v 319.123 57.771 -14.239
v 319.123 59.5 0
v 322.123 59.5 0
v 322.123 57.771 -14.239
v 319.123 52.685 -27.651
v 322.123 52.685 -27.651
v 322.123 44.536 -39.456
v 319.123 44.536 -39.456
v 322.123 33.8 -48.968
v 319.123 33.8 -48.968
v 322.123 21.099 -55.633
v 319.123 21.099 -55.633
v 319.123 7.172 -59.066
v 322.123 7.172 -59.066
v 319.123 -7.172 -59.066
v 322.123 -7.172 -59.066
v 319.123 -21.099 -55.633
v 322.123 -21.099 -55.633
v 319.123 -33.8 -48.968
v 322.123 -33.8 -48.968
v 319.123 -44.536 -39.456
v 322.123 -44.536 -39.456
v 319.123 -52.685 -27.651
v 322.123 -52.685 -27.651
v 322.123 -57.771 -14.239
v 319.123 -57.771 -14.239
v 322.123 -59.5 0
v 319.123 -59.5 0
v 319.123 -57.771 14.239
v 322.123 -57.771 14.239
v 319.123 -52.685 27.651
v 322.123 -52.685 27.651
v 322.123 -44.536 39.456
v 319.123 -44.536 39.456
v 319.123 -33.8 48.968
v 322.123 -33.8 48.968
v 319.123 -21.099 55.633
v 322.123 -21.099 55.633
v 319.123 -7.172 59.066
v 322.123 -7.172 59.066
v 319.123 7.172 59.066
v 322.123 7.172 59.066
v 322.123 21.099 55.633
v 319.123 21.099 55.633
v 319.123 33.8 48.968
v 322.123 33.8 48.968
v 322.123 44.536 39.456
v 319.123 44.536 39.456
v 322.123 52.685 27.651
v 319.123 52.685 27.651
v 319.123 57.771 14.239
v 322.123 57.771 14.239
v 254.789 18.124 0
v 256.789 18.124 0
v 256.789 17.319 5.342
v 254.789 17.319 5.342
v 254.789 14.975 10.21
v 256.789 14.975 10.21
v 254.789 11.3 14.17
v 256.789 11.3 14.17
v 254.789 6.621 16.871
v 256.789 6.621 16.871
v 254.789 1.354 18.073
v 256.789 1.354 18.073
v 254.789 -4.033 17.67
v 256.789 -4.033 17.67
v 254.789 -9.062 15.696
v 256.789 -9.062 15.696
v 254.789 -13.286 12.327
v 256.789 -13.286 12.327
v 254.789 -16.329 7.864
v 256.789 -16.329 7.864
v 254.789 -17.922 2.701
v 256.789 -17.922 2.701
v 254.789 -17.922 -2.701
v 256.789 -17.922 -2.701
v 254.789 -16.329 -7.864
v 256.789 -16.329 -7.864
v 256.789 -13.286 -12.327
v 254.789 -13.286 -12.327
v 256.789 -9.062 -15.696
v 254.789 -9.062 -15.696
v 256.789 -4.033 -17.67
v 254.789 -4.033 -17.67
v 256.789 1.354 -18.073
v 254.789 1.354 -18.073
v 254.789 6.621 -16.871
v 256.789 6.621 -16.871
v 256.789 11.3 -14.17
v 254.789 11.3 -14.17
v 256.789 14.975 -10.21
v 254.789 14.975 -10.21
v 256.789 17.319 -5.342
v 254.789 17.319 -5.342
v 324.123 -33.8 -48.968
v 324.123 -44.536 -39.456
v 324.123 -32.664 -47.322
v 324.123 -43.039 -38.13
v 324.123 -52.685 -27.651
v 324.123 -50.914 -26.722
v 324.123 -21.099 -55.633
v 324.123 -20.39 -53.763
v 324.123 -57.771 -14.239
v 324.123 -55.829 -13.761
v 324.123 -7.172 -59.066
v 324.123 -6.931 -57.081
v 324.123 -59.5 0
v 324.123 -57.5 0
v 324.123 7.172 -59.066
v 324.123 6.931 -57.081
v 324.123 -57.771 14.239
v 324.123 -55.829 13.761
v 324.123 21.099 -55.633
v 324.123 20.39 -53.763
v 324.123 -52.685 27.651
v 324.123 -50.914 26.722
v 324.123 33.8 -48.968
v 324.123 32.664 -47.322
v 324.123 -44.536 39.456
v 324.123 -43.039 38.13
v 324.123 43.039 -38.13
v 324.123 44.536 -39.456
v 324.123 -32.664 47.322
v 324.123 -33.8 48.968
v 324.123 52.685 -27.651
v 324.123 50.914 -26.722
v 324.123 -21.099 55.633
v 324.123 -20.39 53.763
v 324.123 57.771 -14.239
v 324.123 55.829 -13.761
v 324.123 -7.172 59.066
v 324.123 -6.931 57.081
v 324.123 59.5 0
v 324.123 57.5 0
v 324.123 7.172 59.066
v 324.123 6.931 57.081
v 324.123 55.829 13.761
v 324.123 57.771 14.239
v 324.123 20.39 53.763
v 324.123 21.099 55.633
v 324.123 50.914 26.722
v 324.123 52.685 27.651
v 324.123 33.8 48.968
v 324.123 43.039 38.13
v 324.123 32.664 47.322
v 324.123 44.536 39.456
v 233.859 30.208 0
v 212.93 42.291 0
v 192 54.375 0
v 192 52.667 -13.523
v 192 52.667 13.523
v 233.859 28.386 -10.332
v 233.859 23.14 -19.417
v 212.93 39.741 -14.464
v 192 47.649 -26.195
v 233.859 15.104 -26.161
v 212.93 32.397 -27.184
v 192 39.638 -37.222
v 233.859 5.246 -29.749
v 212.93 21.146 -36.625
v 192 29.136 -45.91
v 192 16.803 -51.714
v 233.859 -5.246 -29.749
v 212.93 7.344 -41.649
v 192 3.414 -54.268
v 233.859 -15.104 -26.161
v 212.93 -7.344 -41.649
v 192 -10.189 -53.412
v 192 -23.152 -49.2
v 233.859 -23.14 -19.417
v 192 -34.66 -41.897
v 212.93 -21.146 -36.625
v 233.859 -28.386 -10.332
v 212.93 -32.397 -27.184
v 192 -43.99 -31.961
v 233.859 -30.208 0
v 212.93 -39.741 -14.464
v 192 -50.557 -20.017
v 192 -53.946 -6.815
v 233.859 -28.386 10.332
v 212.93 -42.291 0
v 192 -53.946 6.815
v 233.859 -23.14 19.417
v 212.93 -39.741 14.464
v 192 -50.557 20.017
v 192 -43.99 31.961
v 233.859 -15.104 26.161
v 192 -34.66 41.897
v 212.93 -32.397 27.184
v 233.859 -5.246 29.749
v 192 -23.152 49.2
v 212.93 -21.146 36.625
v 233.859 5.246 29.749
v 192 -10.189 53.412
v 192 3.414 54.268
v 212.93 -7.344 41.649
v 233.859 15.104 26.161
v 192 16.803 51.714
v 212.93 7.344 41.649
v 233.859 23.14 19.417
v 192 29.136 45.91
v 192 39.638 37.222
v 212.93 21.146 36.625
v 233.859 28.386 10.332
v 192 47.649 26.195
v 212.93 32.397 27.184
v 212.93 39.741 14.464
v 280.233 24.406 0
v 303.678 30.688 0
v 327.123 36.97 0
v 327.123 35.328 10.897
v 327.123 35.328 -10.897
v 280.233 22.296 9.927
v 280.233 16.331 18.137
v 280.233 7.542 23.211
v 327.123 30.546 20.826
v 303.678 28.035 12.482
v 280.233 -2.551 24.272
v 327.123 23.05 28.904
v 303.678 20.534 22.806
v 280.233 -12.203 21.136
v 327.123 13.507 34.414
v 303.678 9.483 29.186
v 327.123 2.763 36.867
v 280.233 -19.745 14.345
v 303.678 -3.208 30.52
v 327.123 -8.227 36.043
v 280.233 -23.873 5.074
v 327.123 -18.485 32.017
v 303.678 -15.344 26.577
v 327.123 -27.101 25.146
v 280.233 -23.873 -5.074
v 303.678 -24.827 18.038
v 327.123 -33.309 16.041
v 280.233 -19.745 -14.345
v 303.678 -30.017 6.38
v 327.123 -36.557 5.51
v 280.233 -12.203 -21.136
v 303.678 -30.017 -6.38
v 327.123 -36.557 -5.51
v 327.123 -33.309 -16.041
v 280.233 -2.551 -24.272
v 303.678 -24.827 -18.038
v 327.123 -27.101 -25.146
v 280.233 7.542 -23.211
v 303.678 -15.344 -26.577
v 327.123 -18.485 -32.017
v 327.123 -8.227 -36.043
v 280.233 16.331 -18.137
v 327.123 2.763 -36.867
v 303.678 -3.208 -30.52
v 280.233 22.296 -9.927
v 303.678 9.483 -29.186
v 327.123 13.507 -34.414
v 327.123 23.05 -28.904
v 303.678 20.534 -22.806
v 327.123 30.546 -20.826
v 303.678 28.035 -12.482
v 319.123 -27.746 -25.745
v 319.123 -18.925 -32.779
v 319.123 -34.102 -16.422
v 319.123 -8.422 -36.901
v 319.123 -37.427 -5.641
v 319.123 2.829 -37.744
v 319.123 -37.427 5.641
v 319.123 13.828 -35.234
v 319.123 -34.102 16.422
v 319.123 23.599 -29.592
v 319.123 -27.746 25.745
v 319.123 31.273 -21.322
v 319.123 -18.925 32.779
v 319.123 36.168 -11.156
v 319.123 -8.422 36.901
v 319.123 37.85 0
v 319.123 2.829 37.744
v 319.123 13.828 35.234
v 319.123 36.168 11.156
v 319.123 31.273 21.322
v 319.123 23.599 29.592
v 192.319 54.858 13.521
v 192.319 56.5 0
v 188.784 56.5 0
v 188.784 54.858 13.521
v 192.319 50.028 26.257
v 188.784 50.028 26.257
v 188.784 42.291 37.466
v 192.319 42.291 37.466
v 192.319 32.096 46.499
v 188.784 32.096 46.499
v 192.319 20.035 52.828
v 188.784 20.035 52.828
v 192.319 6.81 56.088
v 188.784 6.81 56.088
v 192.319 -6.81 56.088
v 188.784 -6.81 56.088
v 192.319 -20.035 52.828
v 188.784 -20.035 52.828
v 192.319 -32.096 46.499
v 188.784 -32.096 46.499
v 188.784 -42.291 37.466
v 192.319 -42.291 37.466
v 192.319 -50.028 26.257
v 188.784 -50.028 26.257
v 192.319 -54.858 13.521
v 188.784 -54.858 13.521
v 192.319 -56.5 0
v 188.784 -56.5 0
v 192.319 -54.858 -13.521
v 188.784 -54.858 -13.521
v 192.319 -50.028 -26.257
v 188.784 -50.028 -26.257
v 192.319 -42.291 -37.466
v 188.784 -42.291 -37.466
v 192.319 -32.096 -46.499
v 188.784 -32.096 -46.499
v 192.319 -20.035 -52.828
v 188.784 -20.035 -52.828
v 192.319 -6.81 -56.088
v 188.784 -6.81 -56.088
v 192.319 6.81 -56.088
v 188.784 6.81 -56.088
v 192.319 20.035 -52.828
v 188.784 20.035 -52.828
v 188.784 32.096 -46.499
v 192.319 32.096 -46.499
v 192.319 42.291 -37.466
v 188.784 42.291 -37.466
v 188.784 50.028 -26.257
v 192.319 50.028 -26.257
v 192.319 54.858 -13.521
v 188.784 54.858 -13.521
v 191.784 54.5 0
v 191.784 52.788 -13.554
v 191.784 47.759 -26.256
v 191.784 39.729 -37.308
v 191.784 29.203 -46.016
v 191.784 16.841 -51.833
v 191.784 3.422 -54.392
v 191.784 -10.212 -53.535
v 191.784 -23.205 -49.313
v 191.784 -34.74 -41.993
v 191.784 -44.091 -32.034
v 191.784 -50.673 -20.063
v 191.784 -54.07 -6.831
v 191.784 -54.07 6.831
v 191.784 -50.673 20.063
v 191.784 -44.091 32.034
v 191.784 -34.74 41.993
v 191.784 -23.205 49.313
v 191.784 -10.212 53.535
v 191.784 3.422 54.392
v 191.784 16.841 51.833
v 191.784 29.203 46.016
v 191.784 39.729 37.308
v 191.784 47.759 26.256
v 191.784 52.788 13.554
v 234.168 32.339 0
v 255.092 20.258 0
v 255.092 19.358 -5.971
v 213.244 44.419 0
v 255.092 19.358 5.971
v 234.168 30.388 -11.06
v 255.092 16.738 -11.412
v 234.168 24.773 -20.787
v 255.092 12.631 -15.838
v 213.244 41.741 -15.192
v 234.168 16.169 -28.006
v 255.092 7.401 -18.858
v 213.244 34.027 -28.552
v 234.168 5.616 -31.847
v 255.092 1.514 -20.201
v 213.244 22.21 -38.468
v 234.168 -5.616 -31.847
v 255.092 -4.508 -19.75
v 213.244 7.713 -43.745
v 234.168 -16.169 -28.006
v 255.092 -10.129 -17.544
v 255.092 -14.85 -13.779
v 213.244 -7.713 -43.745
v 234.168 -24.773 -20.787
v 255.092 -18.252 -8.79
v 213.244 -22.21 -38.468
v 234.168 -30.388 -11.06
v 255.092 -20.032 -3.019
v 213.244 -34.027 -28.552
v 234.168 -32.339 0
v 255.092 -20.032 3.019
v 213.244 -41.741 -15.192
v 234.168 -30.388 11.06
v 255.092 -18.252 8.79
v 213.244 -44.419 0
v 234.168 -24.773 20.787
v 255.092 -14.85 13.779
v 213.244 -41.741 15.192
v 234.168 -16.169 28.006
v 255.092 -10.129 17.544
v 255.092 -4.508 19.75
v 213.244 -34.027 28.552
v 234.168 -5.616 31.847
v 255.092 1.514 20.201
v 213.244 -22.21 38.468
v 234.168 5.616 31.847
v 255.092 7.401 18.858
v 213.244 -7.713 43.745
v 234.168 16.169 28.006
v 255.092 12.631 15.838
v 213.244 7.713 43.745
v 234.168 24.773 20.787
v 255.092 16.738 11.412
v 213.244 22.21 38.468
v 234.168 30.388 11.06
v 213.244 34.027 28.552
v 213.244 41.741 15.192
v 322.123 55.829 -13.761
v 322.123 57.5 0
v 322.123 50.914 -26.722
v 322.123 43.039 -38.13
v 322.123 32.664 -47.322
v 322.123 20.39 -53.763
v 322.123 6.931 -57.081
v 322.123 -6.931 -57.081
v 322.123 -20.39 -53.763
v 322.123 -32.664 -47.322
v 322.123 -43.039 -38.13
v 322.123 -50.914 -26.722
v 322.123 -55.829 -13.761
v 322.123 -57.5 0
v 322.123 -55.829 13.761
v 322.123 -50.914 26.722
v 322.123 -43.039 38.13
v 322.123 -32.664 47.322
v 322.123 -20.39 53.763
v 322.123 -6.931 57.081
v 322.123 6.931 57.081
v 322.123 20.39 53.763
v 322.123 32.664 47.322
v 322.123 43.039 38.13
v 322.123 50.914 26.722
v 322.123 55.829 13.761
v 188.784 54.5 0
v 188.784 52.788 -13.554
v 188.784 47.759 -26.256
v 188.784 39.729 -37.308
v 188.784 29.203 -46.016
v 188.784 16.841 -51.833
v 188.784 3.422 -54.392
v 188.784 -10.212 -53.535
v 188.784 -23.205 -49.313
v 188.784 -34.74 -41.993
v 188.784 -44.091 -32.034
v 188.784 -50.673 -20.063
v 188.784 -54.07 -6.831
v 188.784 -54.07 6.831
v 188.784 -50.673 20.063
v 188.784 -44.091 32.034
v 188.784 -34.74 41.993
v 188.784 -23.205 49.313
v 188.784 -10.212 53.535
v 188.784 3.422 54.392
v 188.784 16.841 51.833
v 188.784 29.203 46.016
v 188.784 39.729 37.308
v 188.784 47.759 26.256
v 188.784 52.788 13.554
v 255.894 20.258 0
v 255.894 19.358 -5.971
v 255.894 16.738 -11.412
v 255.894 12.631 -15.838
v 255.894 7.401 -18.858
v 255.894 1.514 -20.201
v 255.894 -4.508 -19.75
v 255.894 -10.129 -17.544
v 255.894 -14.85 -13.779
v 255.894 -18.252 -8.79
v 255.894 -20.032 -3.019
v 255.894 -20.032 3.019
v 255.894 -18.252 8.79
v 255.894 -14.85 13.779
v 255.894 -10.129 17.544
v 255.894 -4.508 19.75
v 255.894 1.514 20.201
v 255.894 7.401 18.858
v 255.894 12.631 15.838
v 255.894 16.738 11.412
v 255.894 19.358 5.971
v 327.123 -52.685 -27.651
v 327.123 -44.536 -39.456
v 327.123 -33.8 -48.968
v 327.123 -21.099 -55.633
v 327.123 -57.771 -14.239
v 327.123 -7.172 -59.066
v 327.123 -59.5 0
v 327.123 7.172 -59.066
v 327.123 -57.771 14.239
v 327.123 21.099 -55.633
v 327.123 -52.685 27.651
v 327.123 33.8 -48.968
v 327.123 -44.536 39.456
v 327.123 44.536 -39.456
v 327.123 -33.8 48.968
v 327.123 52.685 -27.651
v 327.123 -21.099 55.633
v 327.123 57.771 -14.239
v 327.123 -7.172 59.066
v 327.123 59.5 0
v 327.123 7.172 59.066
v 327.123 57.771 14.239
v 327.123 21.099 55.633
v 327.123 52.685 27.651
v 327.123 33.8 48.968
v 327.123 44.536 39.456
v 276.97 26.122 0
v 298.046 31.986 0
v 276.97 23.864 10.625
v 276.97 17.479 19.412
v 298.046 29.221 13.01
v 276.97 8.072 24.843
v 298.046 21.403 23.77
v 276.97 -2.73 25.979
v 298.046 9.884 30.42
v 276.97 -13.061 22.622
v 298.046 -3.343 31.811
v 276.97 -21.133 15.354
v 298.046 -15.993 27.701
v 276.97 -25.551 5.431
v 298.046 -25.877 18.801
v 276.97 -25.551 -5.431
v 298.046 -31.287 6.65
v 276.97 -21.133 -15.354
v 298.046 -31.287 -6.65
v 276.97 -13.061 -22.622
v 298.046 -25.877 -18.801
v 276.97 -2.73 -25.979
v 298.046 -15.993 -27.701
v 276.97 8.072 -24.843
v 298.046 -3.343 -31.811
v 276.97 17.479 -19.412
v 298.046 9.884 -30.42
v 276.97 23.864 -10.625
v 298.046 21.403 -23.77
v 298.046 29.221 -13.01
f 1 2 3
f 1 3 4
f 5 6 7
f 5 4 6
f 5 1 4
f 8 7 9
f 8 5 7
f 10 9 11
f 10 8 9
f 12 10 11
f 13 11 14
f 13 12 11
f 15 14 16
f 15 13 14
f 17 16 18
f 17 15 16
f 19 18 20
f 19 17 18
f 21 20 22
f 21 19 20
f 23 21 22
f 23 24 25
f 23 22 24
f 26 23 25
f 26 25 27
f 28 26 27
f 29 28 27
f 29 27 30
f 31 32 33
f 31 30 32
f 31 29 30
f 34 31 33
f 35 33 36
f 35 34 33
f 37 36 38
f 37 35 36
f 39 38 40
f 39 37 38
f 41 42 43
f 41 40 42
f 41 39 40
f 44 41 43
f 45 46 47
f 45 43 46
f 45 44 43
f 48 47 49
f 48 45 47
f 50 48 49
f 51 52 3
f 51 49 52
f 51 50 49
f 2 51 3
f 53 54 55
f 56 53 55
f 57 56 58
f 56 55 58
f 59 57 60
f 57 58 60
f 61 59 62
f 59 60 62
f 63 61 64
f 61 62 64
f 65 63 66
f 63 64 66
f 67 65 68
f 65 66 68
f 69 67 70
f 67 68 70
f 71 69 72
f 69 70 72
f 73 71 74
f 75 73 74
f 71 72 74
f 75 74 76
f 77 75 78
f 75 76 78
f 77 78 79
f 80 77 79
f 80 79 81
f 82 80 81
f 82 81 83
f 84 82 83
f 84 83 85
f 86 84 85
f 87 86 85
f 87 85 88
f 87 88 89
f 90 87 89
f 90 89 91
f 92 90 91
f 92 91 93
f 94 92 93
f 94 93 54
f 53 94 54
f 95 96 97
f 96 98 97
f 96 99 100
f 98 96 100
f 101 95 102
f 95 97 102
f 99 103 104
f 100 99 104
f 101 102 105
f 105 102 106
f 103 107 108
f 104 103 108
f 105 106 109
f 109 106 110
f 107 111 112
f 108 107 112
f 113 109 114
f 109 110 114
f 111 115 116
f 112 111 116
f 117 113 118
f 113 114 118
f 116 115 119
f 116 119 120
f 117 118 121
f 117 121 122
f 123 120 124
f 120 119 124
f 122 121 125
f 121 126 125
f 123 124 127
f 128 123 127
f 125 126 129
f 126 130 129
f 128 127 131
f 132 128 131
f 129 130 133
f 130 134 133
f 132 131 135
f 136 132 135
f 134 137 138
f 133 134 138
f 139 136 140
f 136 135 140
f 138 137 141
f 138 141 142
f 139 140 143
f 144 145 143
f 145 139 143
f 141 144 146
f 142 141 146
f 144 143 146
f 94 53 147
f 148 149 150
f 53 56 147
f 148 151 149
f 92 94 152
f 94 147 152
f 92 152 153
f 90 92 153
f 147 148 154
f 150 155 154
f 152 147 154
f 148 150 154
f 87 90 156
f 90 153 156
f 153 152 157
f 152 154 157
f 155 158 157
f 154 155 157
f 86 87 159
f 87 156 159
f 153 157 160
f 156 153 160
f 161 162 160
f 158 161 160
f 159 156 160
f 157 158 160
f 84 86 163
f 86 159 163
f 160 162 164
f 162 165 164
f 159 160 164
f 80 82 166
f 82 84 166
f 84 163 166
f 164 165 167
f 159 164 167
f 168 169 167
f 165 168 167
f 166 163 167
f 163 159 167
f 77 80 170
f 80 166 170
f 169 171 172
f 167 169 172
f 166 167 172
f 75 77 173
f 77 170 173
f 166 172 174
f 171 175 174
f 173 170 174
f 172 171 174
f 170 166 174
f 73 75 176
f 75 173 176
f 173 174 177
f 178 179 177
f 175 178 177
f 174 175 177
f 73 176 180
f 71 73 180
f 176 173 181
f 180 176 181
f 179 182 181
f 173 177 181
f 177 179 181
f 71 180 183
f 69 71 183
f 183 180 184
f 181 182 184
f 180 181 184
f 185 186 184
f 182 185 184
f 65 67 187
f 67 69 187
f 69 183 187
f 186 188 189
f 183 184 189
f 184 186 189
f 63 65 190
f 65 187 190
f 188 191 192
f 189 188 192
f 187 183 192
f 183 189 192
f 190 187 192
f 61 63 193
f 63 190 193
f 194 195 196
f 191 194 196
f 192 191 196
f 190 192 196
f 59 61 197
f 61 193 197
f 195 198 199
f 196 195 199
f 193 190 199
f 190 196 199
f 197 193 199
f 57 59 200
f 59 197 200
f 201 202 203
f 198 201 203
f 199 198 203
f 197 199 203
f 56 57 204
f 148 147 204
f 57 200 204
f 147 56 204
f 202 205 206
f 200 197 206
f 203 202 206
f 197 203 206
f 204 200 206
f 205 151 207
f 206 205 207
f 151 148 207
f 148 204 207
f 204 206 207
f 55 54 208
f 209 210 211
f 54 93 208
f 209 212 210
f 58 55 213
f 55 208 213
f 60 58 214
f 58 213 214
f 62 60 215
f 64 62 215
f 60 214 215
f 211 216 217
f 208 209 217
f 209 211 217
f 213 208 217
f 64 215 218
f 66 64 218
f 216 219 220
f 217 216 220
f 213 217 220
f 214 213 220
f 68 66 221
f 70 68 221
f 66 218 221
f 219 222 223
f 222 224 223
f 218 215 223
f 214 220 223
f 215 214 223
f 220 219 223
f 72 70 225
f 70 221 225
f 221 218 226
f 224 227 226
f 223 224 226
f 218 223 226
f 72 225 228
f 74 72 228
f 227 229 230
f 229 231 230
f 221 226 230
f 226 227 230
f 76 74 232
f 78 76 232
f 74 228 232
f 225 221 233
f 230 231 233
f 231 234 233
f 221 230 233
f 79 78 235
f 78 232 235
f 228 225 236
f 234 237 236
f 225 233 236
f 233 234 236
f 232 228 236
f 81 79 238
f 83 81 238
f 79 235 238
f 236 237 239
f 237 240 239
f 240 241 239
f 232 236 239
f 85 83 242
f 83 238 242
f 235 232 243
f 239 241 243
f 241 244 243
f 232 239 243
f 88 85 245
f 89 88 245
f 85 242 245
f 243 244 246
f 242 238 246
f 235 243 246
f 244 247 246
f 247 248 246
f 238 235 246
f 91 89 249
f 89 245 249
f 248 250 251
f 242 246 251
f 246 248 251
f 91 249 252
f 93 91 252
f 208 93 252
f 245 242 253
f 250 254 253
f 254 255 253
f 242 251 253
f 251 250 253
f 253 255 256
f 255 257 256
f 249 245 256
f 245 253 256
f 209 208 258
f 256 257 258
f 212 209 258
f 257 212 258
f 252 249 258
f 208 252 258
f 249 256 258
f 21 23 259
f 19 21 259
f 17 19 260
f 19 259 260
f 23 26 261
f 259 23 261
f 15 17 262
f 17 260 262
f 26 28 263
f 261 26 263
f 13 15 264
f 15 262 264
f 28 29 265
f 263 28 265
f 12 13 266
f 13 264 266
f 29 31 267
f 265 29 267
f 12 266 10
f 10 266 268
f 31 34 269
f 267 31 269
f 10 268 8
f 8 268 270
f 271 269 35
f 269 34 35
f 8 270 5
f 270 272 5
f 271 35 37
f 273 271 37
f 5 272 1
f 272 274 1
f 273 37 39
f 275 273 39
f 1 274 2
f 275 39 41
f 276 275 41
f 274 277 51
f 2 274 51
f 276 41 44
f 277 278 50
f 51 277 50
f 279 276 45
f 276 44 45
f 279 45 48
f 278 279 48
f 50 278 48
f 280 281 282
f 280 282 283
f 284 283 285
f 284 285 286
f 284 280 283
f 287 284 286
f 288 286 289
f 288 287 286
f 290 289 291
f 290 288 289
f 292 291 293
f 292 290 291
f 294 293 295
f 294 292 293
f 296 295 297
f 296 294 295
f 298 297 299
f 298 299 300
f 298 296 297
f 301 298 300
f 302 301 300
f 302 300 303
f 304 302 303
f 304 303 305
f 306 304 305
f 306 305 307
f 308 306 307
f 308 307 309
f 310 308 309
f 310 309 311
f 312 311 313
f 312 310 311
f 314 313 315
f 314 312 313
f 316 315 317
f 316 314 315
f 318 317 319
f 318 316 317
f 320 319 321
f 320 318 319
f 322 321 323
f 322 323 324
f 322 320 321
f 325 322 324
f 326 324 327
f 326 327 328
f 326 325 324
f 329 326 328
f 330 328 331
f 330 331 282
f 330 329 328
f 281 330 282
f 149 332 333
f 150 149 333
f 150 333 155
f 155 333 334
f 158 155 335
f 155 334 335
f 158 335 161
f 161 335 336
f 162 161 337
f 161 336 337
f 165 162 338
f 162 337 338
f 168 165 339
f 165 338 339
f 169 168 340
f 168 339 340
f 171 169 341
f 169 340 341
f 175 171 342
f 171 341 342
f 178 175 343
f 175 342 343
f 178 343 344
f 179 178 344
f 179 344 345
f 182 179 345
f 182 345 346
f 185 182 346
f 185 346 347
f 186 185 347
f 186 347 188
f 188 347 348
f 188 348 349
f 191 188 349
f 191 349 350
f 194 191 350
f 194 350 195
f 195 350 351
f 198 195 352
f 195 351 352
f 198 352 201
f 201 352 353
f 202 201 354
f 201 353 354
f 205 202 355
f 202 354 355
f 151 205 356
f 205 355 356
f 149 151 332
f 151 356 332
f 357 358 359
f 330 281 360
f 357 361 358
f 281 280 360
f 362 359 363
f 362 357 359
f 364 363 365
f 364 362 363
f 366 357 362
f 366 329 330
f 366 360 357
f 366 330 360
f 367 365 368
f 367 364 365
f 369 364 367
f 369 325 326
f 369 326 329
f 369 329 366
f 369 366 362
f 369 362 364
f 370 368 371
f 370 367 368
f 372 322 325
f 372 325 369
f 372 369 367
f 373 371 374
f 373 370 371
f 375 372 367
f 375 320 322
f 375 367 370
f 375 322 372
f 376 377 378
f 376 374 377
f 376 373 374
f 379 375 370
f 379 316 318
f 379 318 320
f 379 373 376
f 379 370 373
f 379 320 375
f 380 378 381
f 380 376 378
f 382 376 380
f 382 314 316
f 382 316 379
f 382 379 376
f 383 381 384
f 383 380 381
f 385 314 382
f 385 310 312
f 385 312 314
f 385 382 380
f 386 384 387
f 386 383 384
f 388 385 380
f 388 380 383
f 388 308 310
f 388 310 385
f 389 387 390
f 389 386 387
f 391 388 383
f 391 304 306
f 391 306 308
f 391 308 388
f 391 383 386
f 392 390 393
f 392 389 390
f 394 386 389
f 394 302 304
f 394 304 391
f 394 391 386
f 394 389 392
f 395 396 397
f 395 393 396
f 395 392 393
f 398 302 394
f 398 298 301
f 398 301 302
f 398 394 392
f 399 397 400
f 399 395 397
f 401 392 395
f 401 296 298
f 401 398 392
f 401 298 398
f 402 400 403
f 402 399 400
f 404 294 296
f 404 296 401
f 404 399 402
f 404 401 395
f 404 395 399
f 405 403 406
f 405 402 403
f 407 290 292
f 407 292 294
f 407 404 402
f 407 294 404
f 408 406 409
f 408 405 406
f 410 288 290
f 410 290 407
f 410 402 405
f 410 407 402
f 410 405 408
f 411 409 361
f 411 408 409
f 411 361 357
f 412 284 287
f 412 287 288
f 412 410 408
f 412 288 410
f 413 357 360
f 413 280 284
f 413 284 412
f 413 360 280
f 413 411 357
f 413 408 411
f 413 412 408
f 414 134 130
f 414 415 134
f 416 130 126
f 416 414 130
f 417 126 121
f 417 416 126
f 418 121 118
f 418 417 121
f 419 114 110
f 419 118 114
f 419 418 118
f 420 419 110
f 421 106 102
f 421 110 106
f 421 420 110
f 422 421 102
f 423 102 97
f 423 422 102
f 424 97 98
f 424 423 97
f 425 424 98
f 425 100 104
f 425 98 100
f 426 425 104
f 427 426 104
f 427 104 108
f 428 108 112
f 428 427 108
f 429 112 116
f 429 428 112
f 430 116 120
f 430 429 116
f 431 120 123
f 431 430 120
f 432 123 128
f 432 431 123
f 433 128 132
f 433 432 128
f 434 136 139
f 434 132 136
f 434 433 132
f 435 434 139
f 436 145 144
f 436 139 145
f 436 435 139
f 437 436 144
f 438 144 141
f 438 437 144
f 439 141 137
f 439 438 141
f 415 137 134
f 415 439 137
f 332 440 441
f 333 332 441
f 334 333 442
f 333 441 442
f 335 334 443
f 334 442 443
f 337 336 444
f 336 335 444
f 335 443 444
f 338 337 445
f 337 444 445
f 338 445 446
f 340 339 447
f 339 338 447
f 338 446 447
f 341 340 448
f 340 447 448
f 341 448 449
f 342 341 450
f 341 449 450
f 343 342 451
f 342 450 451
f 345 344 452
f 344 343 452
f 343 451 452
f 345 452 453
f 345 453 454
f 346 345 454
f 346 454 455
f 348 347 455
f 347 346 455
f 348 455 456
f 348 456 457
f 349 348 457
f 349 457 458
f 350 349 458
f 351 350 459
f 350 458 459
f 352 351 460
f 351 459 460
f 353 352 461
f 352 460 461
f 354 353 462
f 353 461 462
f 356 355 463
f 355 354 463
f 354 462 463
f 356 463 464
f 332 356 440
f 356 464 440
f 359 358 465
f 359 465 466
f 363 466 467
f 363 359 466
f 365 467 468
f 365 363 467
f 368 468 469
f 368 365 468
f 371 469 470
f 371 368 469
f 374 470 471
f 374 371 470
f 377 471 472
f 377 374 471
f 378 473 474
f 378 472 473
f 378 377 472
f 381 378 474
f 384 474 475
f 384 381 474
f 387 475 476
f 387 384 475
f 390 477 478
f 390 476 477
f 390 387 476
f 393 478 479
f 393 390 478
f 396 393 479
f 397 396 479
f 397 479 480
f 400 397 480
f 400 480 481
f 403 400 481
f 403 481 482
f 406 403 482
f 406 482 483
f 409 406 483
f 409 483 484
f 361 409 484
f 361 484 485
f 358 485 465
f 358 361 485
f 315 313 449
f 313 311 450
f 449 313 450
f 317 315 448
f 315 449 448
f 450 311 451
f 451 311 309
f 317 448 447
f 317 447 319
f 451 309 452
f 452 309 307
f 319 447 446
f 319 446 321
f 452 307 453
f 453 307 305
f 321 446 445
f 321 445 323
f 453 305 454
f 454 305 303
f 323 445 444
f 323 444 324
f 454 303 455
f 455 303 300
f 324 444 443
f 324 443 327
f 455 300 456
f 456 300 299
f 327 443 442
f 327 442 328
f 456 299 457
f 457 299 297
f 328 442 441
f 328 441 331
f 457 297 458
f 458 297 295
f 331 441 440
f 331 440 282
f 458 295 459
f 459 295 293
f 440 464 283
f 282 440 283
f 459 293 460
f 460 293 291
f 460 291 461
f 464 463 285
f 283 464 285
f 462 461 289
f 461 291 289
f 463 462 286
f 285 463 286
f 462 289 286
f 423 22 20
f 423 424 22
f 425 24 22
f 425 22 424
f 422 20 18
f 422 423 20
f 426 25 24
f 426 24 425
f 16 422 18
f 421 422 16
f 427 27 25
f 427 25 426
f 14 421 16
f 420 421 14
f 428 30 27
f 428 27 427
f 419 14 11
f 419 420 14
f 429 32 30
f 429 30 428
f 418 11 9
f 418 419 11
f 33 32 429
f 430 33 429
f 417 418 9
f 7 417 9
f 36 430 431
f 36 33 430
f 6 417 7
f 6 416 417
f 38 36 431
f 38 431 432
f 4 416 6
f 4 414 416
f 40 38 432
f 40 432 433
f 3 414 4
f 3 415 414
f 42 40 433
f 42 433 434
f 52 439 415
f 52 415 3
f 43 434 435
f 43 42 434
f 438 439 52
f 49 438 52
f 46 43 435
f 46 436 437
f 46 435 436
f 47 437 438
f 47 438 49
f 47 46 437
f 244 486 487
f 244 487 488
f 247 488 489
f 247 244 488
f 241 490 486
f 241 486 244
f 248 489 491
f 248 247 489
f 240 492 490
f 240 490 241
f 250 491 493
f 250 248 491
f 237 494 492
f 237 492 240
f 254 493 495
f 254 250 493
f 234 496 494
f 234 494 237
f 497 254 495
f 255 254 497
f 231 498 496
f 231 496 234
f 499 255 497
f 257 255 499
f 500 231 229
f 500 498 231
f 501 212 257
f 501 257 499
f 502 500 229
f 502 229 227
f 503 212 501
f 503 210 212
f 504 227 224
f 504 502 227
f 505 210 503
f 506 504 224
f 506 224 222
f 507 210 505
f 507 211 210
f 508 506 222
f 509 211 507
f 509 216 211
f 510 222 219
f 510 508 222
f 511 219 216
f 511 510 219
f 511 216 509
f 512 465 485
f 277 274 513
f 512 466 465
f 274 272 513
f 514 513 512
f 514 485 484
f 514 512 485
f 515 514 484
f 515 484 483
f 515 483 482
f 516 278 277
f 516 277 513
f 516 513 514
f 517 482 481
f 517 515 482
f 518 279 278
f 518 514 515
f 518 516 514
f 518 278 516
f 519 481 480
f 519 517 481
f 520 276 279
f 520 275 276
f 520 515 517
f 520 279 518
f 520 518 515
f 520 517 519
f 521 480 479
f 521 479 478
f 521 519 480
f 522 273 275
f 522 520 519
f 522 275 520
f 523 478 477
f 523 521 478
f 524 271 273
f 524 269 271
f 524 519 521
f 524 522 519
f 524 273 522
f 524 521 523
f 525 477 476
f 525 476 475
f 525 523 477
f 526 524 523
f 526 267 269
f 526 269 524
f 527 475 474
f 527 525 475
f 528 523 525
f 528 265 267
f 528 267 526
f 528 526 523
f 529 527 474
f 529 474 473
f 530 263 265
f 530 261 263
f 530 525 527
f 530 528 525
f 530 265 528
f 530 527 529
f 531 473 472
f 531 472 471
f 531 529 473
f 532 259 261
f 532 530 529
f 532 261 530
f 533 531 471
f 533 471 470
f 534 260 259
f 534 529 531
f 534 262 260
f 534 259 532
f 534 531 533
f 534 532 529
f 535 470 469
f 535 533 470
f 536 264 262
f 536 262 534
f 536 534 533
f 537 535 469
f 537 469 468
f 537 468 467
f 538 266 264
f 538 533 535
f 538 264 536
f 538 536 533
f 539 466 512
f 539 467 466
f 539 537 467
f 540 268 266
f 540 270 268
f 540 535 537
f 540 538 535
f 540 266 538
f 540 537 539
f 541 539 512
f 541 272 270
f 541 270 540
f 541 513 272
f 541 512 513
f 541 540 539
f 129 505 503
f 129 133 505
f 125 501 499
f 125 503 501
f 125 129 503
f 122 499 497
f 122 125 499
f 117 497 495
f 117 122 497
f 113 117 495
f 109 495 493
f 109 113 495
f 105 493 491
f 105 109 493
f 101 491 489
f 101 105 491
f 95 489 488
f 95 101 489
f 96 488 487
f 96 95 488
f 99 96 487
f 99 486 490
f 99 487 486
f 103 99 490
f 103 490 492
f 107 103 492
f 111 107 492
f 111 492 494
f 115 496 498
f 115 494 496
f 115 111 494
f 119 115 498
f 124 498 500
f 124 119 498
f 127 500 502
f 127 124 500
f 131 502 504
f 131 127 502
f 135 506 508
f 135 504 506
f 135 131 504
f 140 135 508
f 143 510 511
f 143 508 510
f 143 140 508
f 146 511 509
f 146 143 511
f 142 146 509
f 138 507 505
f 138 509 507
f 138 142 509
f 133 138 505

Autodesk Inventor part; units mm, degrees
ref_plane "YZ Plane" through (0, 0, 0) normal (1, 0, 0) x (0, 1, 0)
ref_plane "XZ Plane" through (0, 0, 0) normal (0, 1, 0) x (-1, 0, 0)
ref_plane "XY Plane" through (0, 0, 0) normal (0, 0, 1) x (1, 0, 0)
sketch "Sketch1" plane through (0, 0, 0) normal (0, 0, 1) x (1, 0, 0)
  line L0 (254.7886, 18.124) -> (254.7886, 0) construction
  line L1 (192, 54.375) -> (254.7886, 18.124)
  line L2 (0, 0) -> (487.78, 0)
  line L3 (254.7886, 18.124) -> (256.7886, 18.124)
  line L4 (256.7886, 18.124) -> (327.1228, 36.97)
  line L5 (327.1228, 36.97) -> (327.1228, 0)
  line L6 (327.1228, 40.0758) -> (255.8936, 20.258)
  line L7 (255.8936, 20.258) -> (255.0924, 20.258)
  line L8 (255.0924, 20.258) -> (192.3194, 56.5)
  line L9 (327.1228, 36.97) -> (327.1228, 40.0758)
  line L10 (192, 54.375) -> (191.7835, 54.5)
  line L11 (0, 0) -> (0, 54.5)
  line L12 (0, 54.5) -> (274.8621, 54.5) construction
  line L13 (191.7835, 54.5) -> (188.7835, 54.5)
  line L14 (188.7835, 54.5) -> (188.7835, 56.5)
  line L15 (188.7835, 56.5) -> (192.3194, 56.5)
  line L16 (327.1228, 0) -> (327.1228, 59.5)
  line L17 (327.1228, 59.5) -> (323.1228, 59.5)
  line L18 (323.1228, 59.5) -> (319.1228, 59.5)
  line L19 (319.1228, 59.5) -> (319.1228, 37.85)
  line L20 (188.7835, 54.5) -> (188.7835, 0)
  point P0 (322.4487, 38.7754)
  point P1 (191.9595, 55.4142)
  point P2 (188.9595, 55.4)
  point P3 (323.1228, 38.9629)
  dimension "d2" = 18.124
  dimension "d4" = 30
  dimension "d5" = 18.124
  dimension "d6" = 2
  dimension "d7" = 15
  dimension "d8" = 36.97
  dimension "d9" = 2
  dimension "d19" = 54.5
  dimension "d20" = 3
  dimension "d21" = 2
  dimension "d22" = 59.5
  dimension "d23" = 4
  dimension "d24" = 4
revolve "Revolution1" add sketch "Sketch1" angle 360 about axis through (0, 0, 0) along (1, 0, 0) contours L10 L13 L14 L15 L8 L7 L6 L9 L4 L3 L1 | L6 L19 L18 L17 L16
sketch "Sketch2" plane through (0, 0, 0) normal (0, 0, 1) x (1, 0, 0)
  line L0 (319.1228, -59.5) -> (319.1228, 59.5) projected
  line L1 (319.1228, 59.5) -> (322.1228, 59.5)
  line L2 (319.1228, 59.5) -> (327.1228, 59.5) projected
  line L3 (322.1228, 59.5) -> (324.1228, 59.5)
  line L4 (324.1228, 59.5) -> (324.1228, 57.5)
  line L5 (324.1228, 57.5) -> (322.1228, 57.5)
  line L6 (322.1228, 57.5) -> (322.1228, 59.5)
  line L7 (-65.4246, 0) -> (392.5474, 0) projected
  point P0 (0, 0)
  dimension "d25" = 3
  dimension "d26" = 2
  dimension "d27" = 2
revolve "Revolution2" cut sketch "Sketch2" angle 360 about axis through (-10, 0, 0) along (1, 0, 0)
properties part number "stainless steel final nozzle" material "Stainless Steel"
